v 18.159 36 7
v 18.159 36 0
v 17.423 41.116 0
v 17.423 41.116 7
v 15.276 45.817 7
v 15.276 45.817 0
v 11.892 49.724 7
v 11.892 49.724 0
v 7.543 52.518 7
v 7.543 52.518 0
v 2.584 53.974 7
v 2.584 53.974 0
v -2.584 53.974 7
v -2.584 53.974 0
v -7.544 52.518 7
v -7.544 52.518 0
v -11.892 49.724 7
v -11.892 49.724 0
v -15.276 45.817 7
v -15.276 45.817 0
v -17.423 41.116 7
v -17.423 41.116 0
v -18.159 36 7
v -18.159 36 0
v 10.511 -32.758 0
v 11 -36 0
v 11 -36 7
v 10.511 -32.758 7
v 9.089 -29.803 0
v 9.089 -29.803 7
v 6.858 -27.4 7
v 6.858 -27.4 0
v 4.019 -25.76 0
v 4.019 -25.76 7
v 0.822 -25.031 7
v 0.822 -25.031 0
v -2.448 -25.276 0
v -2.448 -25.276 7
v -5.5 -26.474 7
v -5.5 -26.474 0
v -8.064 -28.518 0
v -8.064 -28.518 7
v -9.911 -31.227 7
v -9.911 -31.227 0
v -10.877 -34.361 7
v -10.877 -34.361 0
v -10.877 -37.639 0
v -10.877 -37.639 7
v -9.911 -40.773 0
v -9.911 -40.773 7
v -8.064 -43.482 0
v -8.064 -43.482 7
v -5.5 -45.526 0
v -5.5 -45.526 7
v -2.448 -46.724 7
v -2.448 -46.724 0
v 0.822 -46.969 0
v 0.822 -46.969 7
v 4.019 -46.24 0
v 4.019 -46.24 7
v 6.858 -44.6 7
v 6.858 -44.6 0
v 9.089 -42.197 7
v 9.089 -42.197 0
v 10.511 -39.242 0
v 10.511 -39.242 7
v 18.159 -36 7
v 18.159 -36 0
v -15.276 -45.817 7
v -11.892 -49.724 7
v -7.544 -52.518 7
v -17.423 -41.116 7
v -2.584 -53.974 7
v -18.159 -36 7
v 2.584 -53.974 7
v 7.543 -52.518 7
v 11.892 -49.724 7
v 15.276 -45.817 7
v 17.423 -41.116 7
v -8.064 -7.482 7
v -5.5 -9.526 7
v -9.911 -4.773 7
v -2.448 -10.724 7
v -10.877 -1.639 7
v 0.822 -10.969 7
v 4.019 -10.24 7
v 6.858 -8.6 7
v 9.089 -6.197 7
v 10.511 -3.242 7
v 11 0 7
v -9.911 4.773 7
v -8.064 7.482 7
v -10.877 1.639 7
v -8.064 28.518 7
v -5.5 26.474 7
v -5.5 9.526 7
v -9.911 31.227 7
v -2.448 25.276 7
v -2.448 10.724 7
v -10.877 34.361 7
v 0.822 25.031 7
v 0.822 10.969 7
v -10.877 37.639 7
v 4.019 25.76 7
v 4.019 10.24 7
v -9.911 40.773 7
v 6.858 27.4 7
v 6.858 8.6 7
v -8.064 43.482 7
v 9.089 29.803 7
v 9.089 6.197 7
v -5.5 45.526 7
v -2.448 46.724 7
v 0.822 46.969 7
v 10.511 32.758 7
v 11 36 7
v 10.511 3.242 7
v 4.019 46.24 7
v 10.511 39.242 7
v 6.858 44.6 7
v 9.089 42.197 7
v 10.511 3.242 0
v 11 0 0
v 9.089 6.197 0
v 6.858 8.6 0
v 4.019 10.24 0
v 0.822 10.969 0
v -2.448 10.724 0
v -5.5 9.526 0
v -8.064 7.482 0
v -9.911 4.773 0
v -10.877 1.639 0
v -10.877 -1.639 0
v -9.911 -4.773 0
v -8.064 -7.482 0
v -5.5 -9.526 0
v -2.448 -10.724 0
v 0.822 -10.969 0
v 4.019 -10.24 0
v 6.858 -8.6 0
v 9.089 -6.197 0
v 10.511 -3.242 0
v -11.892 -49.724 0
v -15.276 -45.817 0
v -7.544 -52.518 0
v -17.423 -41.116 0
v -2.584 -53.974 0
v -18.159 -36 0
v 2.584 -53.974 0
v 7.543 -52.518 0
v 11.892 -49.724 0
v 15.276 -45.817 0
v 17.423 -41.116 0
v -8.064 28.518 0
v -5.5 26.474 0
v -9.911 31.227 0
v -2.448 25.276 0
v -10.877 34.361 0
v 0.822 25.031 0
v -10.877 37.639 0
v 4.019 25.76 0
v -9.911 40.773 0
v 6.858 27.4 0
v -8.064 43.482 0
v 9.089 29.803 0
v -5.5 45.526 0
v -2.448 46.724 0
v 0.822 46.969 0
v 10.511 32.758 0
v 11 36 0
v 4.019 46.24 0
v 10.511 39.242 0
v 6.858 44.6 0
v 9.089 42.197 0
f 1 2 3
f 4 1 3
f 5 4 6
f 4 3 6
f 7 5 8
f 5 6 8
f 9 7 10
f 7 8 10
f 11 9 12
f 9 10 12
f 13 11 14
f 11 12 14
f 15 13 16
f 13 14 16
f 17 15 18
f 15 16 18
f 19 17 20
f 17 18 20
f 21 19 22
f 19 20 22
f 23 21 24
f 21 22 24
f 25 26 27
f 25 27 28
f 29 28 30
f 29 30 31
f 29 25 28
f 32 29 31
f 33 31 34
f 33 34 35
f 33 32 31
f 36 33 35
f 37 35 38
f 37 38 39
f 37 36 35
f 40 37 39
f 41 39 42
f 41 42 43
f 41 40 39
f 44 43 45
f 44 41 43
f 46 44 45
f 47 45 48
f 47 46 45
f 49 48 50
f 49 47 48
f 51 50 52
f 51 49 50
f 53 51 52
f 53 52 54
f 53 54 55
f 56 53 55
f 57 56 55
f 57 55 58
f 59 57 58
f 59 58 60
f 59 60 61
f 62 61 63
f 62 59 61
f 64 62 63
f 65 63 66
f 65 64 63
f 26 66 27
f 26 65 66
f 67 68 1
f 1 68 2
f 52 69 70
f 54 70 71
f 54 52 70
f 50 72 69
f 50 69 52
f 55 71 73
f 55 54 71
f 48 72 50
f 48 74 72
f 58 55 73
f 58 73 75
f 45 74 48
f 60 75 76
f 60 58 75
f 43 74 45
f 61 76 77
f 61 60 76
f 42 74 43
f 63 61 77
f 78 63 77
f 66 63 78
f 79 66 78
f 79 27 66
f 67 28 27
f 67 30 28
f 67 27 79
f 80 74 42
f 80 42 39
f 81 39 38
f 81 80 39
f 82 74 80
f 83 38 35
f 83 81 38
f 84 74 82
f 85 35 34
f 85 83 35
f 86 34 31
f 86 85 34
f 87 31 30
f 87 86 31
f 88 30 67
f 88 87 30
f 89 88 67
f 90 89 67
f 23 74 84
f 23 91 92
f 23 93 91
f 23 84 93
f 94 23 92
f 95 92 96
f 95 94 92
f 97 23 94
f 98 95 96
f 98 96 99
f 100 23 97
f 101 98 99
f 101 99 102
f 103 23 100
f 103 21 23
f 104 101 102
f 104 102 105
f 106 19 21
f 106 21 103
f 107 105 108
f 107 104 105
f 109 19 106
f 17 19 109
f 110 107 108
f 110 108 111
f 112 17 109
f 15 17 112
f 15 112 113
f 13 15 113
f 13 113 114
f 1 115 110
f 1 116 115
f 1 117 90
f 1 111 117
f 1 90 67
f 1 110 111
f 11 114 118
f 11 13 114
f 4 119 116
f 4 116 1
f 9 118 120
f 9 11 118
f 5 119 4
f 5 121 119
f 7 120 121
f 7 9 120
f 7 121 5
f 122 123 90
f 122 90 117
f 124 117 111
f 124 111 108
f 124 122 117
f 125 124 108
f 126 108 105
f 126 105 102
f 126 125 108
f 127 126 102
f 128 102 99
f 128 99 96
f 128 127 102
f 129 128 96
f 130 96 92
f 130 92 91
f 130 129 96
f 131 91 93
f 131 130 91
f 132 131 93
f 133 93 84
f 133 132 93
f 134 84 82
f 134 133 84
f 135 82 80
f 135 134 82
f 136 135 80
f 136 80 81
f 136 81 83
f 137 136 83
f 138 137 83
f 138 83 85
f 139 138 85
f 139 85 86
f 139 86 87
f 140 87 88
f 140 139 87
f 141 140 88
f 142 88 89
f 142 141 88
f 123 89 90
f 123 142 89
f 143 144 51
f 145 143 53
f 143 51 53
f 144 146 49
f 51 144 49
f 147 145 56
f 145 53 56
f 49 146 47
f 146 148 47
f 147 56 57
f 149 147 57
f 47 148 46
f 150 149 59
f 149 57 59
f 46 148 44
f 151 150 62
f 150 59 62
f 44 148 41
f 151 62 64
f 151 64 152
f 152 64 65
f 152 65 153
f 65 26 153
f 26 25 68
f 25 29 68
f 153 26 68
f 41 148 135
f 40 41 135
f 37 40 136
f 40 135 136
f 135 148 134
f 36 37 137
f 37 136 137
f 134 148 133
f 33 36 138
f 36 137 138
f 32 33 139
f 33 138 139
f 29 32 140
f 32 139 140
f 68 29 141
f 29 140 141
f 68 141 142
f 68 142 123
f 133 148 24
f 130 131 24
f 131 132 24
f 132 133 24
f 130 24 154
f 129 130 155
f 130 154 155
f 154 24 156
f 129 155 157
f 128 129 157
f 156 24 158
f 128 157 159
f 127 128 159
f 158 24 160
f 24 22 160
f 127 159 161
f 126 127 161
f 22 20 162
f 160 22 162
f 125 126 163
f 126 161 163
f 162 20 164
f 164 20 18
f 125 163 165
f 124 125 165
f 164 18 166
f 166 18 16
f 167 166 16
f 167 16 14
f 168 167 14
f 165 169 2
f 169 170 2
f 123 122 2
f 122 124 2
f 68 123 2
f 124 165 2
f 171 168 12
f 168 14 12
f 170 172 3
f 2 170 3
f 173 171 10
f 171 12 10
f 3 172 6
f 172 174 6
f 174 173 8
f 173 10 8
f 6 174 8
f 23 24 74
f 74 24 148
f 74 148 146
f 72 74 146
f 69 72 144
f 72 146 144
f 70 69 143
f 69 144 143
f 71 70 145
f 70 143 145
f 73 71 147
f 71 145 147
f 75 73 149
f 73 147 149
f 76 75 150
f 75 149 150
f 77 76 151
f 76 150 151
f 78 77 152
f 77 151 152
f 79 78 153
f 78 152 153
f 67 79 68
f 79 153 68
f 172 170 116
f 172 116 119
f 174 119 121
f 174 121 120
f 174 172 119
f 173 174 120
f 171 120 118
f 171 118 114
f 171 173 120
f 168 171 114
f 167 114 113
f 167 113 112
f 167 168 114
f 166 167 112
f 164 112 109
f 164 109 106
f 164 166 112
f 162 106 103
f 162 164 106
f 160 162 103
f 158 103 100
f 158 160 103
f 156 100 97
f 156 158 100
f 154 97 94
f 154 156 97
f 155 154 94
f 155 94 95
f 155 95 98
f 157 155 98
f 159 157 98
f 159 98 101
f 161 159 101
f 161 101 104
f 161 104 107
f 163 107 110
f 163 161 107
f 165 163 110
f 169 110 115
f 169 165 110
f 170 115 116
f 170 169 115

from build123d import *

# Parameters (mm, degrees)
F0_R     = 11
F1_DEPTH = 7


with BuildPart() as f1:
    # F0 (on Top) → F1 (new body)
    with BuildSketch(Plane.XY):
        with BuildLine():
            ThreePointArc((18.15895, 36), (-1e-06, 54.158951), (-18.158952, 36))
            Line((-18.158952, 36), (-18.158952, -36))
            ThreePointArc((-18.158952, -36), (-1e-06, -54.158951), (18.15895, -36))
            Line((18.15895, -36), (18.15895, 36))
        make_face()
        with Locations((-1e-06, -36)):
            Circle(F0_R, mode=Mode.SUBTRACT)
        with Locations((-1e-06, 36)):
            Circle(F0_R, mode=Mode.SUBTRACT)
        Circle(F0_R, mode=Mode.SUBTRACT)
    extrude(amount=F1_DEPTH)


solid = f1.part
